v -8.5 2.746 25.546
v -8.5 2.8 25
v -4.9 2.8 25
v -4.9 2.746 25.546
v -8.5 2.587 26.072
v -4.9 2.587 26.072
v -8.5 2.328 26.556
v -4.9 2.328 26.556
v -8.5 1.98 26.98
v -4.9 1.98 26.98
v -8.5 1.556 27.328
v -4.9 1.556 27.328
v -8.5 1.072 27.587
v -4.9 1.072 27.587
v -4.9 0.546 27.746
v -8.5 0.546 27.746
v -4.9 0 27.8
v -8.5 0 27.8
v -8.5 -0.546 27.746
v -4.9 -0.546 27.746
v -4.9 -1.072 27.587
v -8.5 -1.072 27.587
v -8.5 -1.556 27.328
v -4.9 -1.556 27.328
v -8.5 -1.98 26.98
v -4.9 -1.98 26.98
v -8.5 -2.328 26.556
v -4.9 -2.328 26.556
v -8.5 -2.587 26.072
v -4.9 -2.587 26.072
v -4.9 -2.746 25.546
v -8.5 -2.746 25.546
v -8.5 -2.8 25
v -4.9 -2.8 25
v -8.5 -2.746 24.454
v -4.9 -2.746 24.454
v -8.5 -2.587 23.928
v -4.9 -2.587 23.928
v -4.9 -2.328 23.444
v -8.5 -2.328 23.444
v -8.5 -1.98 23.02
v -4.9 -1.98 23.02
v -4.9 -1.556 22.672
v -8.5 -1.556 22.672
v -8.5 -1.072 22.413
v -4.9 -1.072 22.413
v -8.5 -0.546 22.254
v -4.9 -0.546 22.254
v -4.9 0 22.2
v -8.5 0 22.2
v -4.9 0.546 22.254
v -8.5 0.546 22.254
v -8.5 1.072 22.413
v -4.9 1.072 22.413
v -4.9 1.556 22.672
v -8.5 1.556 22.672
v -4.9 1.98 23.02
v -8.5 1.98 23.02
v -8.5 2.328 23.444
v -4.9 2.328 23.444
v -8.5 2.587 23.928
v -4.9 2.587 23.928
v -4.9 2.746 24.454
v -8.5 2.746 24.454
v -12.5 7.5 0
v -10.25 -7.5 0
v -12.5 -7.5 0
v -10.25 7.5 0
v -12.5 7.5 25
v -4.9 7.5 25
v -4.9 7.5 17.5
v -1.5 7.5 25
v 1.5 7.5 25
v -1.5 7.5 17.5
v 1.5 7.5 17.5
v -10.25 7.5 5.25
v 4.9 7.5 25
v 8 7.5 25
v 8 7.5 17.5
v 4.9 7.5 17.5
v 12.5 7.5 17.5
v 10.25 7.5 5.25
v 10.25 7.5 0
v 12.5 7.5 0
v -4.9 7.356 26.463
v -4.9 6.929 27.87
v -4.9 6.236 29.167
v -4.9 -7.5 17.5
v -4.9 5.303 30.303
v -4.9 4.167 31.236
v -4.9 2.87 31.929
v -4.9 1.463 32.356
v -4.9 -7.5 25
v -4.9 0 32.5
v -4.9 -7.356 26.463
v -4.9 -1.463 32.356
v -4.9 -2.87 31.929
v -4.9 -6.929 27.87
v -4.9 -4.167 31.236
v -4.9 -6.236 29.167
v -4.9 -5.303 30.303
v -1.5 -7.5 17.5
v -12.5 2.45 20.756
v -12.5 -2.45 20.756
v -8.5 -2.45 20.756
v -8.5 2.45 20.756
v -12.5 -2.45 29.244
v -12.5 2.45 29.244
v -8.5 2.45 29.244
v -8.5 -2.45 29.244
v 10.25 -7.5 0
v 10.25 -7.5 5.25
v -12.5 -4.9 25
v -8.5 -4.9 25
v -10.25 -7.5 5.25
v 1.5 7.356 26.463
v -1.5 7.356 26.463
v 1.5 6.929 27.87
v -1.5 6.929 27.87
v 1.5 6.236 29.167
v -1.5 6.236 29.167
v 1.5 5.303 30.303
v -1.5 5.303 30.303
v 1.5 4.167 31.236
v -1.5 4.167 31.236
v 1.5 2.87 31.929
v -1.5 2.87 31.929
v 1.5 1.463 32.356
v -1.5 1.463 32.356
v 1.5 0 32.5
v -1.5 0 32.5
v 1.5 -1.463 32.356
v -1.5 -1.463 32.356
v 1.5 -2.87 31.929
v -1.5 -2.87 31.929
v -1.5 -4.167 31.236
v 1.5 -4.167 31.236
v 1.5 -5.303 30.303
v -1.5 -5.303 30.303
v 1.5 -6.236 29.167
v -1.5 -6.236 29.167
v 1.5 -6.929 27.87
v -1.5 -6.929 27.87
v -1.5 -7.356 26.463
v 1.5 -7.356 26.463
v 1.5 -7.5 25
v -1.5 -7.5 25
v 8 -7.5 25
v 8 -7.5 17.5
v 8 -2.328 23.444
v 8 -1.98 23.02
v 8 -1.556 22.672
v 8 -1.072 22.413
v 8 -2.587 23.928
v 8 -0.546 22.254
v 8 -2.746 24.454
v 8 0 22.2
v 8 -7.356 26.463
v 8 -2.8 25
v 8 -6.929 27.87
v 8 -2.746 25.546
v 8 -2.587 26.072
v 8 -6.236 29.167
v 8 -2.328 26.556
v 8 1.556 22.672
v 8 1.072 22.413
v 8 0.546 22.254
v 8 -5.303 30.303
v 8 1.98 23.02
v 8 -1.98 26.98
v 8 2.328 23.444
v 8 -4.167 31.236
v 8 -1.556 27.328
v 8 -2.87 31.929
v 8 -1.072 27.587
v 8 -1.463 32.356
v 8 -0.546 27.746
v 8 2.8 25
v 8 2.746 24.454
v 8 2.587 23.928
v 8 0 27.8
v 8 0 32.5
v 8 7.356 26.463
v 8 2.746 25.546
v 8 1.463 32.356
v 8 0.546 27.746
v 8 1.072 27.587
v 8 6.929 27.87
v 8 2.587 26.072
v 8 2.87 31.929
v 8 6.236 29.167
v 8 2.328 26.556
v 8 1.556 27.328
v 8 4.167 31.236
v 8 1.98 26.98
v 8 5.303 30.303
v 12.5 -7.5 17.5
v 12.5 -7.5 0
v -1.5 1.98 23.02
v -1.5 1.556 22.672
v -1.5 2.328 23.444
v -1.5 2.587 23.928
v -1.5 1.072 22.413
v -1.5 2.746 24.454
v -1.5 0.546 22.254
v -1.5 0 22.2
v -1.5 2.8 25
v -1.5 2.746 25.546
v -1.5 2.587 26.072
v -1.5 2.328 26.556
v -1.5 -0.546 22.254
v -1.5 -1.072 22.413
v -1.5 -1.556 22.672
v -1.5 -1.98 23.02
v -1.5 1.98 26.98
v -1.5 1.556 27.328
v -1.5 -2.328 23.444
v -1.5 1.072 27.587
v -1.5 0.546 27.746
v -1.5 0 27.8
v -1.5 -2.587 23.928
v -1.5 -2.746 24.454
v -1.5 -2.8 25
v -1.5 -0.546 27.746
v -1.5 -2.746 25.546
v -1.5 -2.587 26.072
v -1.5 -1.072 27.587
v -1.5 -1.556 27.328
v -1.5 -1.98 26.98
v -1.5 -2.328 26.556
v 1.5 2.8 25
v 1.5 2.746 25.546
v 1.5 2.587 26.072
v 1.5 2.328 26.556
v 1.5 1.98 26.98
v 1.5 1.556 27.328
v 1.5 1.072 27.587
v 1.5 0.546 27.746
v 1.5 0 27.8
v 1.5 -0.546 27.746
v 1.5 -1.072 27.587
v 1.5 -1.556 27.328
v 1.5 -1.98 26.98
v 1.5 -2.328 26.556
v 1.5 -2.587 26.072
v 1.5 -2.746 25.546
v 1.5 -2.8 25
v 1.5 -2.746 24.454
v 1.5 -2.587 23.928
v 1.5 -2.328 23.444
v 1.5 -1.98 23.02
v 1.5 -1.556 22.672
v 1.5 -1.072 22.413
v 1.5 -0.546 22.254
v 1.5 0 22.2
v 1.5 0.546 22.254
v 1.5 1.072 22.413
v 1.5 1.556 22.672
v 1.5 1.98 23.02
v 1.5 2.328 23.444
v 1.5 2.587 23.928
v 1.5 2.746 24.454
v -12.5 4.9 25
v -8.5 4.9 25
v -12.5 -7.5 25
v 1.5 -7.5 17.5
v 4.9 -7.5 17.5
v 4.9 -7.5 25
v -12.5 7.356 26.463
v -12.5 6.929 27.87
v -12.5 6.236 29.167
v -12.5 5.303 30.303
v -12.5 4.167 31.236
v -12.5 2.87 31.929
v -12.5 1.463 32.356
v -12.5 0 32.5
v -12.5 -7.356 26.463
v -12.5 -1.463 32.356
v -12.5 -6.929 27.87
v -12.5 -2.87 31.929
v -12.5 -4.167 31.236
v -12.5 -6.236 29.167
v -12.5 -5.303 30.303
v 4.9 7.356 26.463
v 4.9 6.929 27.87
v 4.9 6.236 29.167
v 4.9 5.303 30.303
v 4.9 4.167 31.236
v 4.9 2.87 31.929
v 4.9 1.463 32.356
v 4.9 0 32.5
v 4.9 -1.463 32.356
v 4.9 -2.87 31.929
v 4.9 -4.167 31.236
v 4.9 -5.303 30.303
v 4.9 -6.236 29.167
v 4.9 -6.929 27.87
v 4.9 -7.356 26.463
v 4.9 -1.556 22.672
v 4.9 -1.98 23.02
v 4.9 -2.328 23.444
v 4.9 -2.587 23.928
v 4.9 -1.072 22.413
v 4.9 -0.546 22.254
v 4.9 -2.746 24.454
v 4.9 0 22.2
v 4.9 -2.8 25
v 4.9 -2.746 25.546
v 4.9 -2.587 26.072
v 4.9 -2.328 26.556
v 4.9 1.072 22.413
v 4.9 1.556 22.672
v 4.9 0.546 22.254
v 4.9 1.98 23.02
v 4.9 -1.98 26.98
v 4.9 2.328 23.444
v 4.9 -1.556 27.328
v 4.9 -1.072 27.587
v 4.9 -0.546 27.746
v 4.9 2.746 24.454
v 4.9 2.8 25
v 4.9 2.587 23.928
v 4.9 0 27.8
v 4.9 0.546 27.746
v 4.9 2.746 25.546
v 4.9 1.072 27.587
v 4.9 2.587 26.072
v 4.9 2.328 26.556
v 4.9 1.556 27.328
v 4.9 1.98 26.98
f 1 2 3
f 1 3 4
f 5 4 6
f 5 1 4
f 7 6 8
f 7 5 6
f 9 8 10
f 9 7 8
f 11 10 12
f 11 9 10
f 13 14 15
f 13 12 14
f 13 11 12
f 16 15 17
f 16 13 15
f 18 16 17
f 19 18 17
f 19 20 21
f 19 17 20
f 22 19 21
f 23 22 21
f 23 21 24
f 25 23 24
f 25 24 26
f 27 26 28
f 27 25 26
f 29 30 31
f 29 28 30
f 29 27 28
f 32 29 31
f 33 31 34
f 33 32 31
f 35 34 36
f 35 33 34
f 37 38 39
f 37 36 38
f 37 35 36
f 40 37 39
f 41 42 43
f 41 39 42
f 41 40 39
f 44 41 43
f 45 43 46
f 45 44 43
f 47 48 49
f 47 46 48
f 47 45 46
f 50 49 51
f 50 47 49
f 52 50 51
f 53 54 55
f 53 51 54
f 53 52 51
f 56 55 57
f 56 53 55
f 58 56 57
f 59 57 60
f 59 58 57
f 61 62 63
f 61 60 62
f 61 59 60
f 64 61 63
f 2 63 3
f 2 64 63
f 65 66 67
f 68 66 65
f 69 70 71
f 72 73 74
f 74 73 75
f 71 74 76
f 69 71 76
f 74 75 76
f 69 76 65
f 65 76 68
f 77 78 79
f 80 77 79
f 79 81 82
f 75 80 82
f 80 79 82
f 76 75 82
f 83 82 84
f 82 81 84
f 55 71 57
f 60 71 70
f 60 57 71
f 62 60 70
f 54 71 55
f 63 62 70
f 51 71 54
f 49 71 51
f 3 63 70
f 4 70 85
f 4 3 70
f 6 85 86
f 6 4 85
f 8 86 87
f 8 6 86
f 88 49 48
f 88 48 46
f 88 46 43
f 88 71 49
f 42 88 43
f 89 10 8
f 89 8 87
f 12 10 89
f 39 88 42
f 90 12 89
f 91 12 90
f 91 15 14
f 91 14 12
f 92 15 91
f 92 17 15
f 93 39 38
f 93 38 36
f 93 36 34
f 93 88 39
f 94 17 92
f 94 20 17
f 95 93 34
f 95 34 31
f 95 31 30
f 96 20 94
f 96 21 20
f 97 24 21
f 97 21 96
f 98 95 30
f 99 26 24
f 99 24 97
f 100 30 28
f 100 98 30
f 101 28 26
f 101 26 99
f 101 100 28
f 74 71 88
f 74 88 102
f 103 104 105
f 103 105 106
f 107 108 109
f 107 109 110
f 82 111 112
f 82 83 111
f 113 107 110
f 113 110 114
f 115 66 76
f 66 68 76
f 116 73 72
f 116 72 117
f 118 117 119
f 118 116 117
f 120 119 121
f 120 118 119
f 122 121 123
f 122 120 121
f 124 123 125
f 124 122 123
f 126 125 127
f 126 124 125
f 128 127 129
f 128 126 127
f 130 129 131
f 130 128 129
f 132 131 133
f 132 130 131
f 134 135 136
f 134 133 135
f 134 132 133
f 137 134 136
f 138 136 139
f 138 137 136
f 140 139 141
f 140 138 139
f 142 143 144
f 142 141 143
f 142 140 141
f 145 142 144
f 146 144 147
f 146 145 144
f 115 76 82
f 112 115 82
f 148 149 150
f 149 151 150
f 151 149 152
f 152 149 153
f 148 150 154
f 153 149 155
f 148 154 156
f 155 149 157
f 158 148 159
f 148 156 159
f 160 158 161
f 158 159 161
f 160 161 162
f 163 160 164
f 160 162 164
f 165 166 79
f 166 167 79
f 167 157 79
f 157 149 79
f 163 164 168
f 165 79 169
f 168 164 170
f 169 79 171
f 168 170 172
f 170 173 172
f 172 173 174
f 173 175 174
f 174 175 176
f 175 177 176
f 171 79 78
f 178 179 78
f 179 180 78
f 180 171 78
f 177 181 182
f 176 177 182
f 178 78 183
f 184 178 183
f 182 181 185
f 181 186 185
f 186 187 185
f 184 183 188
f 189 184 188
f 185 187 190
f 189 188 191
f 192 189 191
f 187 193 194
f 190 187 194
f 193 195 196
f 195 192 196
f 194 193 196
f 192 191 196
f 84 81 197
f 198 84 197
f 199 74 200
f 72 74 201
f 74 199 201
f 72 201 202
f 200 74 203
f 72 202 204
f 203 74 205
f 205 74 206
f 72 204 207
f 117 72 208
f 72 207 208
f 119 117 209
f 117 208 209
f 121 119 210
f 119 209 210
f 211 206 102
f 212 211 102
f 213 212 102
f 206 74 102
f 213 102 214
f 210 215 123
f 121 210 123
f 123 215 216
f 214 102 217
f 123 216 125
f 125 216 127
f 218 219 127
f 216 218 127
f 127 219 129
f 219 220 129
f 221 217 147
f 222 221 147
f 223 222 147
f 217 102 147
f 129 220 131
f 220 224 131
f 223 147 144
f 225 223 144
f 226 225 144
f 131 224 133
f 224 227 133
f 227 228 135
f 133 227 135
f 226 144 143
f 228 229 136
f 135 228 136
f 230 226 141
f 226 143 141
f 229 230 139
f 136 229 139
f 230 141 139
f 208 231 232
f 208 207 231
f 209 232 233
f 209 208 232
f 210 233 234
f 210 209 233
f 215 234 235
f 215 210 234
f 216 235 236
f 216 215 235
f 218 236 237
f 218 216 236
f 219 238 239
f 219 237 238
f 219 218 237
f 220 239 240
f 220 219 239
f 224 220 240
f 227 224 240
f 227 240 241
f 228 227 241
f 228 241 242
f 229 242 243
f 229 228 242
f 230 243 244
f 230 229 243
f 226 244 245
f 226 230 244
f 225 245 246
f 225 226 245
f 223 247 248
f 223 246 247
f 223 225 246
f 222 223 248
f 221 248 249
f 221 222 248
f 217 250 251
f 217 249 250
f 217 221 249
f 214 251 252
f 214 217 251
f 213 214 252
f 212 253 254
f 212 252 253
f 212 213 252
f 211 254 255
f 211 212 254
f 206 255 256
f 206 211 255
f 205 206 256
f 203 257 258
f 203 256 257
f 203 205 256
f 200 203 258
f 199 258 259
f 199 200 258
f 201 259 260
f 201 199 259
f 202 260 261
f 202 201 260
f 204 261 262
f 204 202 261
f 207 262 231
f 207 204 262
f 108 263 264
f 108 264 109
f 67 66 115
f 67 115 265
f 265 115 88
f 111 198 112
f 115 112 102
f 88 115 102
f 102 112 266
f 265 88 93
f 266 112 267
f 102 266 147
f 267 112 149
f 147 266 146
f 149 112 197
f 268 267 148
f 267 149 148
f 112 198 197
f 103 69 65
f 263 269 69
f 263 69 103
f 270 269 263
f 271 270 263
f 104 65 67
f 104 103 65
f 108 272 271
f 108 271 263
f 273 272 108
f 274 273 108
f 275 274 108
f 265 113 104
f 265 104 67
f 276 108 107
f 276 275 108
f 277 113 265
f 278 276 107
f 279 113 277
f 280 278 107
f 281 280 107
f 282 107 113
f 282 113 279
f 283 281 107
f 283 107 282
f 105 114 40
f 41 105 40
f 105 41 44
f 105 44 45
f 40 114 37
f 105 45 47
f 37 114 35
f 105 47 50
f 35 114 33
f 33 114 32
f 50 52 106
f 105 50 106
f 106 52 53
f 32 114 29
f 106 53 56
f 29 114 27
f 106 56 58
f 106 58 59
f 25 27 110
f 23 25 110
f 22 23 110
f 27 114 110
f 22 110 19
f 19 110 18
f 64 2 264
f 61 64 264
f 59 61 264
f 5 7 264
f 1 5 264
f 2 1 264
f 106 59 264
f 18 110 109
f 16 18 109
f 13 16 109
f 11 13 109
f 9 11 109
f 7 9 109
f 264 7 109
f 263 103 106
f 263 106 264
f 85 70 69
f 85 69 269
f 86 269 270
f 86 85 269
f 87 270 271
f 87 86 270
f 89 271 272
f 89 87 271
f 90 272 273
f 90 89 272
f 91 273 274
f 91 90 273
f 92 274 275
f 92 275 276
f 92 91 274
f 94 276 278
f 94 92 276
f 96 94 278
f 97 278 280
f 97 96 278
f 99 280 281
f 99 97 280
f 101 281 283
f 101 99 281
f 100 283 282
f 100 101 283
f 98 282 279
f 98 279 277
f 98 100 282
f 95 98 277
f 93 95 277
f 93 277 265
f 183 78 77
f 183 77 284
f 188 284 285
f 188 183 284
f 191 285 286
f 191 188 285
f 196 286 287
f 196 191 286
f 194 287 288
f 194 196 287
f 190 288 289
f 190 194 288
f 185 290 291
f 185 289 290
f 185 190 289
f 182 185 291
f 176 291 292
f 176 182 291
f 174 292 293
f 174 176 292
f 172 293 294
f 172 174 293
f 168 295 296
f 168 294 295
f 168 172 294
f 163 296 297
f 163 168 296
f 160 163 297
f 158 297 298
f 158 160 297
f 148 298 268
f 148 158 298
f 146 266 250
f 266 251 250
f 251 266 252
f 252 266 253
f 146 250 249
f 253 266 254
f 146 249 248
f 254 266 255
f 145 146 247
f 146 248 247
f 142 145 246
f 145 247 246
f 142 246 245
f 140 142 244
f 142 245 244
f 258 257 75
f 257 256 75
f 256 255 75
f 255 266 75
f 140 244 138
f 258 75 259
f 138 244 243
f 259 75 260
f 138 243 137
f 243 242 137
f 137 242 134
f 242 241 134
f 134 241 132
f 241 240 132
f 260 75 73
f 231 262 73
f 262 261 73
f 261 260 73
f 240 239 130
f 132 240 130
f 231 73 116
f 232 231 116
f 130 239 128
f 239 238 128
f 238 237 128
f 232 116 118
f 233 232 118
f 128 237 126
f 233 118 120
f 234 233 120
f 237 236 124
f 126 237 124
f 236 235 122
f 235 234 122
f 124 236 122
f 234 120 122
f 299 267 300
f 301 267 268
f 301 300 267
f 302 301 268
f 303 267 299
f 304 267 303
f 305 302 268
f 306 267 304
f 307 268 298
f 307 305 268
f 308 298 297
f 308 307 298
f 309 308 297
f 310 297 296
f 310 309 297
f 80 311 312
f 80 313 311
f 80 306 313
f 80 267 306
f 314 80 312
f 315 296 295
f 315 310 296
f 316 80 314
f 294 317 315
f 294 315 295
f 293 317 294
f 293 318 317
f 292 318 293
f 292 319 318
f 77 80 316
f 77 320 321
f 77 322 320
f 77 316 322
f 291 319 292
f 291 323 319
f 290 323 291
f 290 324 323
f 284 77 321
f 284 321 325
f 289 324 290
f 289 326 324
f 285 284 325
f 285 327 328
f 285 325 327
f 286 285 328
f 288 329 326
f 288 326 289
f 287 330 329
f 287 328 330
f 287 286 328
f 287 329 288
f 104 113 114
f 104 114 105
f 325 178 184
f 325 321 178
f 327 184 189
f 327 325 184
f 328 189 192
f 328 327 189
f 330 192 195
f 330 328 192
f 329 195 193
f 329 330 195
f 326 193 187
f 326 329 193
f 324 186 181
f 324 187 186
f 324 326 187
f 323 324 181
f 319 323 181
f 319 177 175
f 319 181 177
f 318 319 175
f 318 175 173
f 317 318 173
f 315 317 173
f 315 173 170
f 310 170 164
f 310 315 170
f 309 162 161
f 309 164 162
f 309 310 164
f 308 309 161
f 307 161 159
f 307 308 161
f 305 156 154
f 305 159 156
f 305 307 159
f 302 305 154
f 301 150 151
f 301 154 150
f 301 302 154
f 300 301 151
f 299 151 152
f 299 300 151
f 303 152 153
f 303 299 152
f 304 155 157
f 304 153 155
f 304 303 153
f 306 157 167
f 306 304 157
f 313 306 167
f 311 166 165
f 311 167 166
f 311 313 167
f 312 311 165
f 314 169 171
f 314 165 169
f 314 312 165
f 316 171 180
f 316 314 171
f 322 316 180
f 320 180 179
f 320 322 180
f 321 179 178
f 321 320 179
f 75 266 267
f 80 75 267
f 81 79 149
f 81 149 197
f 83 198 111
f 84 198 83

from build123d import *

# Parameters (mm, degrees)
SKETCH009_R     = 2.8
PAD_DEPTH       = 12.5
SKETCH015_W     = 20.5
SKETCH015_H     = 10.5
SKETCH015_W_2   = 3.4
SKETCH015_H_2   = 15
SKETCH015_W_3   = 15
POCKET_DEPTH    = 15
POCKET001_DEPTH = 4


with BuildPart() as part:
    # Sketch009 → Pad (new body, symmetric)
    with BuildSketch(Plane.YZ):
        with BuildLine():
            Line((7.5, 25), (7.5, 0))
            Line((-7.5, 0), (7.5, 0))
            Line((-7.5, 0), (-7.5, 25))
            ThreePointArc((7.5, 25), (0, 32.5), (-7.5, 25))
        make_face()
        with Locations((0, 25)):
            Circle(SKETCH009_R, mode=Mode.SUBTRACT)
    extrude(amount=PAD_DEPTH, both=True)

    # Sketch015 → Pocket (cut, symmetric)
    with BuildSketch(Plane.XZ):
        Rectangle(SKETCH015_W, SKETCH015_H)
        with Locations((3.2, 25)):
            Rectangle(SKETCH015_W_2, SKETCH015_H_2)
        with Locations((15.5, 25)):
            Rectangle(SKETCH015_W_3, SKETCH015_H_2)
        with Locations((-3.2, 25)):
            Rectangle(SKETCH015_W_2, SKETCH015_H_2)
    extrude(amount=POCKET_DEPTH, both=True, mode=Mode.SUBTRACT)

    # Sketch016 → Pocket001 (cut)
    with BuildSketch(Plane.YZ.offset(-12.5)):
        Polygon((-2.45, 20.756476), (2.45, 20.756476), (4.9, 25), (2.45, 29.243524), (-2.45, 29.243524), (-4.9, 25), align=None)
    extrude(amount=POCKET001_DEPTH, mode=Mode.SUBTRACT)


solid = part.part
